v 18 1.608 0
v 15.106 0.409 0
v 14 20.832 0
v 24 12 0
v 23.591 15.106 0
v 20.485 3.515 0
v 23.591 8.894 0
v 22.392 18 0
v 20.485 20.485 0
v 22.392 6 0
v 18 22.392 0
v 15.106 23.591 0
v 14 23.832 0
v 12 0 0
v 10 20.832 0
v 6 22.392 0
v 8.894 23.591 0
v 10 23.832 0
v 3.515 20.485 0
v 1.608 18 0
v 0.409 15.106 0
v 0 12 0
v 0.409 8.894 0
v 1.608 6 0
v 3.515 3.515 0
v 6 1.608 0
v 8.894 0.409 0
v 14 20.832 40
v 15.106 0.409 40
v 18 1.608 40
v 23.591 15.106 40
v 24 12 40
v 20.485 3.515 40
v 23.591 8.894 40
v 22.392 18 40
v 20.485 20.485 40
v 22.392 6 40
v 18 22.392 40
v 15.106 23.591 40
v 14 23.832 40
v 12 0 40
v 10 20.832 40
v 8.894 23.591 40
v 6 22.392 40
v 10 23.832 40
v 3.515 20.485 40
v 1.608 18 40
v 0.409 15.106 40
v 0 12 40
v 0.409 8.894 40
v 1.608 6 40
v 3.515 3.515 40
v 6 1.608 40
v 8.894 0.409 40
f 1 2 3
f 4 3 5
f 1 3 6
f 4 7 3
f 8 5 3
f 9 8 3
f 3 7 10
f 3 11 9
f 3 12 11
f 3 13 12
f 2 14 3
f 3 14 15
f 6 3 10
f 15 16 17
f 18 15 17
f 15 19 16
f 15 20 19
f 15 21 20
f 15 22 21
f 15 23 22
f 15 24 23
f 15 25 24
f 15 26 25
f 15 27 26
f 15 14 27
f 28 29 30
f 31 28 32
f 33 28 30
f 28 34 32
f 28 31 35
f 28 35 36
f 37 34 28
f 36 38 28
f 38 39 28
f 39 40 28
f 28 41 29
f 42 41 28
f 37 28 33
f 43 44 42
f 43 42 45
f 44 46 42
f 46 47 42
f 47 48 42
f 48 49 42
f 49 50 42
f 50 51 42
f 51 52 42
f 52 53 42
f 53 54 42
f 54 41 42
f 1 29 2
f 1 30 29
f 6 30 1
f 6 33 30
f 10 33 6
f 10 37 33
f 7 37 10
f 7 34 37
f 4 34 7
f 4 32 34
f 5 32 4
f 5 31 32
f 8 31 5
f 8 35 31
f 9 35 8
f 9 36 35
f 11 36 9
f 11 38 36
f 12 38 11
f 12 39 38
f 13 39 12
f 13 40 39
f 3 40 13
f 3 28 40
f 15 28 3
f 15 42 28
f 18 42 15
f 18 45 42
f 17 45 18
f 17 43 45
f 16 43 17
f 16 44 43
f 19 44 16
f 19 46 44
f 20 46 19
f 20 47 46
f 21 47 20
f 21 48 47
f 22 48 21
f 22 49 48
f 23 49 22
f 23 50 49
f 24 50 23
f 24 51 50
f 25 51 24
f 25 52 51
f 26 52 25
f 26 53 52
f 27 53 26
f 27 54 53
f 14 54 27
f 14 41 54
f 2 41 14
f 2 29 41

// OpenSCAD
$fn = 32;

// ----------------------------------------------------------------------
// Keyway shaft: d24 shaft, key 4 x 3 mm
// ----------------------------------------------------------------------

// --- parameters (mm) ---
shaft_r = 12;             // shaft radius
key_w = 4;                // keyway width
key_d = 3;                // keyway depth below the surface line
plate_t = 40;             // shaft length, Z (extrusion height)

shaft_d = 2 * shaft_r;  // shaft diameter
circle_step = 15;  // polygon sampling step, degrees

profile = [[8.894, 23.591], [6, 22.392], [3.515, 20.485], [1.608, 18], [0.409, 15.106], [0, 12], [0.409, 8.894], [1.608, 6], [3.515, 3.515], [6, 1.608], [8.894, 0.409], [12, 0], [15.106, 0.409], [18, 1.608], [20.485, 3.515], [22.392, 6], [23.591, 8.894], [24, 12], [23.591, 15.106], [22.392, 18], [20.485, 20.485], [18, 22.392], [15.106, 23.591], [14, 23.832], [14, 20.832], [10, 20.832], [10, 23.832]];  // primary outline, 27 points, counter clockwise

// --- the one profile operation ---
linear_extrude(height = plate_t) polygon(points = profile);
